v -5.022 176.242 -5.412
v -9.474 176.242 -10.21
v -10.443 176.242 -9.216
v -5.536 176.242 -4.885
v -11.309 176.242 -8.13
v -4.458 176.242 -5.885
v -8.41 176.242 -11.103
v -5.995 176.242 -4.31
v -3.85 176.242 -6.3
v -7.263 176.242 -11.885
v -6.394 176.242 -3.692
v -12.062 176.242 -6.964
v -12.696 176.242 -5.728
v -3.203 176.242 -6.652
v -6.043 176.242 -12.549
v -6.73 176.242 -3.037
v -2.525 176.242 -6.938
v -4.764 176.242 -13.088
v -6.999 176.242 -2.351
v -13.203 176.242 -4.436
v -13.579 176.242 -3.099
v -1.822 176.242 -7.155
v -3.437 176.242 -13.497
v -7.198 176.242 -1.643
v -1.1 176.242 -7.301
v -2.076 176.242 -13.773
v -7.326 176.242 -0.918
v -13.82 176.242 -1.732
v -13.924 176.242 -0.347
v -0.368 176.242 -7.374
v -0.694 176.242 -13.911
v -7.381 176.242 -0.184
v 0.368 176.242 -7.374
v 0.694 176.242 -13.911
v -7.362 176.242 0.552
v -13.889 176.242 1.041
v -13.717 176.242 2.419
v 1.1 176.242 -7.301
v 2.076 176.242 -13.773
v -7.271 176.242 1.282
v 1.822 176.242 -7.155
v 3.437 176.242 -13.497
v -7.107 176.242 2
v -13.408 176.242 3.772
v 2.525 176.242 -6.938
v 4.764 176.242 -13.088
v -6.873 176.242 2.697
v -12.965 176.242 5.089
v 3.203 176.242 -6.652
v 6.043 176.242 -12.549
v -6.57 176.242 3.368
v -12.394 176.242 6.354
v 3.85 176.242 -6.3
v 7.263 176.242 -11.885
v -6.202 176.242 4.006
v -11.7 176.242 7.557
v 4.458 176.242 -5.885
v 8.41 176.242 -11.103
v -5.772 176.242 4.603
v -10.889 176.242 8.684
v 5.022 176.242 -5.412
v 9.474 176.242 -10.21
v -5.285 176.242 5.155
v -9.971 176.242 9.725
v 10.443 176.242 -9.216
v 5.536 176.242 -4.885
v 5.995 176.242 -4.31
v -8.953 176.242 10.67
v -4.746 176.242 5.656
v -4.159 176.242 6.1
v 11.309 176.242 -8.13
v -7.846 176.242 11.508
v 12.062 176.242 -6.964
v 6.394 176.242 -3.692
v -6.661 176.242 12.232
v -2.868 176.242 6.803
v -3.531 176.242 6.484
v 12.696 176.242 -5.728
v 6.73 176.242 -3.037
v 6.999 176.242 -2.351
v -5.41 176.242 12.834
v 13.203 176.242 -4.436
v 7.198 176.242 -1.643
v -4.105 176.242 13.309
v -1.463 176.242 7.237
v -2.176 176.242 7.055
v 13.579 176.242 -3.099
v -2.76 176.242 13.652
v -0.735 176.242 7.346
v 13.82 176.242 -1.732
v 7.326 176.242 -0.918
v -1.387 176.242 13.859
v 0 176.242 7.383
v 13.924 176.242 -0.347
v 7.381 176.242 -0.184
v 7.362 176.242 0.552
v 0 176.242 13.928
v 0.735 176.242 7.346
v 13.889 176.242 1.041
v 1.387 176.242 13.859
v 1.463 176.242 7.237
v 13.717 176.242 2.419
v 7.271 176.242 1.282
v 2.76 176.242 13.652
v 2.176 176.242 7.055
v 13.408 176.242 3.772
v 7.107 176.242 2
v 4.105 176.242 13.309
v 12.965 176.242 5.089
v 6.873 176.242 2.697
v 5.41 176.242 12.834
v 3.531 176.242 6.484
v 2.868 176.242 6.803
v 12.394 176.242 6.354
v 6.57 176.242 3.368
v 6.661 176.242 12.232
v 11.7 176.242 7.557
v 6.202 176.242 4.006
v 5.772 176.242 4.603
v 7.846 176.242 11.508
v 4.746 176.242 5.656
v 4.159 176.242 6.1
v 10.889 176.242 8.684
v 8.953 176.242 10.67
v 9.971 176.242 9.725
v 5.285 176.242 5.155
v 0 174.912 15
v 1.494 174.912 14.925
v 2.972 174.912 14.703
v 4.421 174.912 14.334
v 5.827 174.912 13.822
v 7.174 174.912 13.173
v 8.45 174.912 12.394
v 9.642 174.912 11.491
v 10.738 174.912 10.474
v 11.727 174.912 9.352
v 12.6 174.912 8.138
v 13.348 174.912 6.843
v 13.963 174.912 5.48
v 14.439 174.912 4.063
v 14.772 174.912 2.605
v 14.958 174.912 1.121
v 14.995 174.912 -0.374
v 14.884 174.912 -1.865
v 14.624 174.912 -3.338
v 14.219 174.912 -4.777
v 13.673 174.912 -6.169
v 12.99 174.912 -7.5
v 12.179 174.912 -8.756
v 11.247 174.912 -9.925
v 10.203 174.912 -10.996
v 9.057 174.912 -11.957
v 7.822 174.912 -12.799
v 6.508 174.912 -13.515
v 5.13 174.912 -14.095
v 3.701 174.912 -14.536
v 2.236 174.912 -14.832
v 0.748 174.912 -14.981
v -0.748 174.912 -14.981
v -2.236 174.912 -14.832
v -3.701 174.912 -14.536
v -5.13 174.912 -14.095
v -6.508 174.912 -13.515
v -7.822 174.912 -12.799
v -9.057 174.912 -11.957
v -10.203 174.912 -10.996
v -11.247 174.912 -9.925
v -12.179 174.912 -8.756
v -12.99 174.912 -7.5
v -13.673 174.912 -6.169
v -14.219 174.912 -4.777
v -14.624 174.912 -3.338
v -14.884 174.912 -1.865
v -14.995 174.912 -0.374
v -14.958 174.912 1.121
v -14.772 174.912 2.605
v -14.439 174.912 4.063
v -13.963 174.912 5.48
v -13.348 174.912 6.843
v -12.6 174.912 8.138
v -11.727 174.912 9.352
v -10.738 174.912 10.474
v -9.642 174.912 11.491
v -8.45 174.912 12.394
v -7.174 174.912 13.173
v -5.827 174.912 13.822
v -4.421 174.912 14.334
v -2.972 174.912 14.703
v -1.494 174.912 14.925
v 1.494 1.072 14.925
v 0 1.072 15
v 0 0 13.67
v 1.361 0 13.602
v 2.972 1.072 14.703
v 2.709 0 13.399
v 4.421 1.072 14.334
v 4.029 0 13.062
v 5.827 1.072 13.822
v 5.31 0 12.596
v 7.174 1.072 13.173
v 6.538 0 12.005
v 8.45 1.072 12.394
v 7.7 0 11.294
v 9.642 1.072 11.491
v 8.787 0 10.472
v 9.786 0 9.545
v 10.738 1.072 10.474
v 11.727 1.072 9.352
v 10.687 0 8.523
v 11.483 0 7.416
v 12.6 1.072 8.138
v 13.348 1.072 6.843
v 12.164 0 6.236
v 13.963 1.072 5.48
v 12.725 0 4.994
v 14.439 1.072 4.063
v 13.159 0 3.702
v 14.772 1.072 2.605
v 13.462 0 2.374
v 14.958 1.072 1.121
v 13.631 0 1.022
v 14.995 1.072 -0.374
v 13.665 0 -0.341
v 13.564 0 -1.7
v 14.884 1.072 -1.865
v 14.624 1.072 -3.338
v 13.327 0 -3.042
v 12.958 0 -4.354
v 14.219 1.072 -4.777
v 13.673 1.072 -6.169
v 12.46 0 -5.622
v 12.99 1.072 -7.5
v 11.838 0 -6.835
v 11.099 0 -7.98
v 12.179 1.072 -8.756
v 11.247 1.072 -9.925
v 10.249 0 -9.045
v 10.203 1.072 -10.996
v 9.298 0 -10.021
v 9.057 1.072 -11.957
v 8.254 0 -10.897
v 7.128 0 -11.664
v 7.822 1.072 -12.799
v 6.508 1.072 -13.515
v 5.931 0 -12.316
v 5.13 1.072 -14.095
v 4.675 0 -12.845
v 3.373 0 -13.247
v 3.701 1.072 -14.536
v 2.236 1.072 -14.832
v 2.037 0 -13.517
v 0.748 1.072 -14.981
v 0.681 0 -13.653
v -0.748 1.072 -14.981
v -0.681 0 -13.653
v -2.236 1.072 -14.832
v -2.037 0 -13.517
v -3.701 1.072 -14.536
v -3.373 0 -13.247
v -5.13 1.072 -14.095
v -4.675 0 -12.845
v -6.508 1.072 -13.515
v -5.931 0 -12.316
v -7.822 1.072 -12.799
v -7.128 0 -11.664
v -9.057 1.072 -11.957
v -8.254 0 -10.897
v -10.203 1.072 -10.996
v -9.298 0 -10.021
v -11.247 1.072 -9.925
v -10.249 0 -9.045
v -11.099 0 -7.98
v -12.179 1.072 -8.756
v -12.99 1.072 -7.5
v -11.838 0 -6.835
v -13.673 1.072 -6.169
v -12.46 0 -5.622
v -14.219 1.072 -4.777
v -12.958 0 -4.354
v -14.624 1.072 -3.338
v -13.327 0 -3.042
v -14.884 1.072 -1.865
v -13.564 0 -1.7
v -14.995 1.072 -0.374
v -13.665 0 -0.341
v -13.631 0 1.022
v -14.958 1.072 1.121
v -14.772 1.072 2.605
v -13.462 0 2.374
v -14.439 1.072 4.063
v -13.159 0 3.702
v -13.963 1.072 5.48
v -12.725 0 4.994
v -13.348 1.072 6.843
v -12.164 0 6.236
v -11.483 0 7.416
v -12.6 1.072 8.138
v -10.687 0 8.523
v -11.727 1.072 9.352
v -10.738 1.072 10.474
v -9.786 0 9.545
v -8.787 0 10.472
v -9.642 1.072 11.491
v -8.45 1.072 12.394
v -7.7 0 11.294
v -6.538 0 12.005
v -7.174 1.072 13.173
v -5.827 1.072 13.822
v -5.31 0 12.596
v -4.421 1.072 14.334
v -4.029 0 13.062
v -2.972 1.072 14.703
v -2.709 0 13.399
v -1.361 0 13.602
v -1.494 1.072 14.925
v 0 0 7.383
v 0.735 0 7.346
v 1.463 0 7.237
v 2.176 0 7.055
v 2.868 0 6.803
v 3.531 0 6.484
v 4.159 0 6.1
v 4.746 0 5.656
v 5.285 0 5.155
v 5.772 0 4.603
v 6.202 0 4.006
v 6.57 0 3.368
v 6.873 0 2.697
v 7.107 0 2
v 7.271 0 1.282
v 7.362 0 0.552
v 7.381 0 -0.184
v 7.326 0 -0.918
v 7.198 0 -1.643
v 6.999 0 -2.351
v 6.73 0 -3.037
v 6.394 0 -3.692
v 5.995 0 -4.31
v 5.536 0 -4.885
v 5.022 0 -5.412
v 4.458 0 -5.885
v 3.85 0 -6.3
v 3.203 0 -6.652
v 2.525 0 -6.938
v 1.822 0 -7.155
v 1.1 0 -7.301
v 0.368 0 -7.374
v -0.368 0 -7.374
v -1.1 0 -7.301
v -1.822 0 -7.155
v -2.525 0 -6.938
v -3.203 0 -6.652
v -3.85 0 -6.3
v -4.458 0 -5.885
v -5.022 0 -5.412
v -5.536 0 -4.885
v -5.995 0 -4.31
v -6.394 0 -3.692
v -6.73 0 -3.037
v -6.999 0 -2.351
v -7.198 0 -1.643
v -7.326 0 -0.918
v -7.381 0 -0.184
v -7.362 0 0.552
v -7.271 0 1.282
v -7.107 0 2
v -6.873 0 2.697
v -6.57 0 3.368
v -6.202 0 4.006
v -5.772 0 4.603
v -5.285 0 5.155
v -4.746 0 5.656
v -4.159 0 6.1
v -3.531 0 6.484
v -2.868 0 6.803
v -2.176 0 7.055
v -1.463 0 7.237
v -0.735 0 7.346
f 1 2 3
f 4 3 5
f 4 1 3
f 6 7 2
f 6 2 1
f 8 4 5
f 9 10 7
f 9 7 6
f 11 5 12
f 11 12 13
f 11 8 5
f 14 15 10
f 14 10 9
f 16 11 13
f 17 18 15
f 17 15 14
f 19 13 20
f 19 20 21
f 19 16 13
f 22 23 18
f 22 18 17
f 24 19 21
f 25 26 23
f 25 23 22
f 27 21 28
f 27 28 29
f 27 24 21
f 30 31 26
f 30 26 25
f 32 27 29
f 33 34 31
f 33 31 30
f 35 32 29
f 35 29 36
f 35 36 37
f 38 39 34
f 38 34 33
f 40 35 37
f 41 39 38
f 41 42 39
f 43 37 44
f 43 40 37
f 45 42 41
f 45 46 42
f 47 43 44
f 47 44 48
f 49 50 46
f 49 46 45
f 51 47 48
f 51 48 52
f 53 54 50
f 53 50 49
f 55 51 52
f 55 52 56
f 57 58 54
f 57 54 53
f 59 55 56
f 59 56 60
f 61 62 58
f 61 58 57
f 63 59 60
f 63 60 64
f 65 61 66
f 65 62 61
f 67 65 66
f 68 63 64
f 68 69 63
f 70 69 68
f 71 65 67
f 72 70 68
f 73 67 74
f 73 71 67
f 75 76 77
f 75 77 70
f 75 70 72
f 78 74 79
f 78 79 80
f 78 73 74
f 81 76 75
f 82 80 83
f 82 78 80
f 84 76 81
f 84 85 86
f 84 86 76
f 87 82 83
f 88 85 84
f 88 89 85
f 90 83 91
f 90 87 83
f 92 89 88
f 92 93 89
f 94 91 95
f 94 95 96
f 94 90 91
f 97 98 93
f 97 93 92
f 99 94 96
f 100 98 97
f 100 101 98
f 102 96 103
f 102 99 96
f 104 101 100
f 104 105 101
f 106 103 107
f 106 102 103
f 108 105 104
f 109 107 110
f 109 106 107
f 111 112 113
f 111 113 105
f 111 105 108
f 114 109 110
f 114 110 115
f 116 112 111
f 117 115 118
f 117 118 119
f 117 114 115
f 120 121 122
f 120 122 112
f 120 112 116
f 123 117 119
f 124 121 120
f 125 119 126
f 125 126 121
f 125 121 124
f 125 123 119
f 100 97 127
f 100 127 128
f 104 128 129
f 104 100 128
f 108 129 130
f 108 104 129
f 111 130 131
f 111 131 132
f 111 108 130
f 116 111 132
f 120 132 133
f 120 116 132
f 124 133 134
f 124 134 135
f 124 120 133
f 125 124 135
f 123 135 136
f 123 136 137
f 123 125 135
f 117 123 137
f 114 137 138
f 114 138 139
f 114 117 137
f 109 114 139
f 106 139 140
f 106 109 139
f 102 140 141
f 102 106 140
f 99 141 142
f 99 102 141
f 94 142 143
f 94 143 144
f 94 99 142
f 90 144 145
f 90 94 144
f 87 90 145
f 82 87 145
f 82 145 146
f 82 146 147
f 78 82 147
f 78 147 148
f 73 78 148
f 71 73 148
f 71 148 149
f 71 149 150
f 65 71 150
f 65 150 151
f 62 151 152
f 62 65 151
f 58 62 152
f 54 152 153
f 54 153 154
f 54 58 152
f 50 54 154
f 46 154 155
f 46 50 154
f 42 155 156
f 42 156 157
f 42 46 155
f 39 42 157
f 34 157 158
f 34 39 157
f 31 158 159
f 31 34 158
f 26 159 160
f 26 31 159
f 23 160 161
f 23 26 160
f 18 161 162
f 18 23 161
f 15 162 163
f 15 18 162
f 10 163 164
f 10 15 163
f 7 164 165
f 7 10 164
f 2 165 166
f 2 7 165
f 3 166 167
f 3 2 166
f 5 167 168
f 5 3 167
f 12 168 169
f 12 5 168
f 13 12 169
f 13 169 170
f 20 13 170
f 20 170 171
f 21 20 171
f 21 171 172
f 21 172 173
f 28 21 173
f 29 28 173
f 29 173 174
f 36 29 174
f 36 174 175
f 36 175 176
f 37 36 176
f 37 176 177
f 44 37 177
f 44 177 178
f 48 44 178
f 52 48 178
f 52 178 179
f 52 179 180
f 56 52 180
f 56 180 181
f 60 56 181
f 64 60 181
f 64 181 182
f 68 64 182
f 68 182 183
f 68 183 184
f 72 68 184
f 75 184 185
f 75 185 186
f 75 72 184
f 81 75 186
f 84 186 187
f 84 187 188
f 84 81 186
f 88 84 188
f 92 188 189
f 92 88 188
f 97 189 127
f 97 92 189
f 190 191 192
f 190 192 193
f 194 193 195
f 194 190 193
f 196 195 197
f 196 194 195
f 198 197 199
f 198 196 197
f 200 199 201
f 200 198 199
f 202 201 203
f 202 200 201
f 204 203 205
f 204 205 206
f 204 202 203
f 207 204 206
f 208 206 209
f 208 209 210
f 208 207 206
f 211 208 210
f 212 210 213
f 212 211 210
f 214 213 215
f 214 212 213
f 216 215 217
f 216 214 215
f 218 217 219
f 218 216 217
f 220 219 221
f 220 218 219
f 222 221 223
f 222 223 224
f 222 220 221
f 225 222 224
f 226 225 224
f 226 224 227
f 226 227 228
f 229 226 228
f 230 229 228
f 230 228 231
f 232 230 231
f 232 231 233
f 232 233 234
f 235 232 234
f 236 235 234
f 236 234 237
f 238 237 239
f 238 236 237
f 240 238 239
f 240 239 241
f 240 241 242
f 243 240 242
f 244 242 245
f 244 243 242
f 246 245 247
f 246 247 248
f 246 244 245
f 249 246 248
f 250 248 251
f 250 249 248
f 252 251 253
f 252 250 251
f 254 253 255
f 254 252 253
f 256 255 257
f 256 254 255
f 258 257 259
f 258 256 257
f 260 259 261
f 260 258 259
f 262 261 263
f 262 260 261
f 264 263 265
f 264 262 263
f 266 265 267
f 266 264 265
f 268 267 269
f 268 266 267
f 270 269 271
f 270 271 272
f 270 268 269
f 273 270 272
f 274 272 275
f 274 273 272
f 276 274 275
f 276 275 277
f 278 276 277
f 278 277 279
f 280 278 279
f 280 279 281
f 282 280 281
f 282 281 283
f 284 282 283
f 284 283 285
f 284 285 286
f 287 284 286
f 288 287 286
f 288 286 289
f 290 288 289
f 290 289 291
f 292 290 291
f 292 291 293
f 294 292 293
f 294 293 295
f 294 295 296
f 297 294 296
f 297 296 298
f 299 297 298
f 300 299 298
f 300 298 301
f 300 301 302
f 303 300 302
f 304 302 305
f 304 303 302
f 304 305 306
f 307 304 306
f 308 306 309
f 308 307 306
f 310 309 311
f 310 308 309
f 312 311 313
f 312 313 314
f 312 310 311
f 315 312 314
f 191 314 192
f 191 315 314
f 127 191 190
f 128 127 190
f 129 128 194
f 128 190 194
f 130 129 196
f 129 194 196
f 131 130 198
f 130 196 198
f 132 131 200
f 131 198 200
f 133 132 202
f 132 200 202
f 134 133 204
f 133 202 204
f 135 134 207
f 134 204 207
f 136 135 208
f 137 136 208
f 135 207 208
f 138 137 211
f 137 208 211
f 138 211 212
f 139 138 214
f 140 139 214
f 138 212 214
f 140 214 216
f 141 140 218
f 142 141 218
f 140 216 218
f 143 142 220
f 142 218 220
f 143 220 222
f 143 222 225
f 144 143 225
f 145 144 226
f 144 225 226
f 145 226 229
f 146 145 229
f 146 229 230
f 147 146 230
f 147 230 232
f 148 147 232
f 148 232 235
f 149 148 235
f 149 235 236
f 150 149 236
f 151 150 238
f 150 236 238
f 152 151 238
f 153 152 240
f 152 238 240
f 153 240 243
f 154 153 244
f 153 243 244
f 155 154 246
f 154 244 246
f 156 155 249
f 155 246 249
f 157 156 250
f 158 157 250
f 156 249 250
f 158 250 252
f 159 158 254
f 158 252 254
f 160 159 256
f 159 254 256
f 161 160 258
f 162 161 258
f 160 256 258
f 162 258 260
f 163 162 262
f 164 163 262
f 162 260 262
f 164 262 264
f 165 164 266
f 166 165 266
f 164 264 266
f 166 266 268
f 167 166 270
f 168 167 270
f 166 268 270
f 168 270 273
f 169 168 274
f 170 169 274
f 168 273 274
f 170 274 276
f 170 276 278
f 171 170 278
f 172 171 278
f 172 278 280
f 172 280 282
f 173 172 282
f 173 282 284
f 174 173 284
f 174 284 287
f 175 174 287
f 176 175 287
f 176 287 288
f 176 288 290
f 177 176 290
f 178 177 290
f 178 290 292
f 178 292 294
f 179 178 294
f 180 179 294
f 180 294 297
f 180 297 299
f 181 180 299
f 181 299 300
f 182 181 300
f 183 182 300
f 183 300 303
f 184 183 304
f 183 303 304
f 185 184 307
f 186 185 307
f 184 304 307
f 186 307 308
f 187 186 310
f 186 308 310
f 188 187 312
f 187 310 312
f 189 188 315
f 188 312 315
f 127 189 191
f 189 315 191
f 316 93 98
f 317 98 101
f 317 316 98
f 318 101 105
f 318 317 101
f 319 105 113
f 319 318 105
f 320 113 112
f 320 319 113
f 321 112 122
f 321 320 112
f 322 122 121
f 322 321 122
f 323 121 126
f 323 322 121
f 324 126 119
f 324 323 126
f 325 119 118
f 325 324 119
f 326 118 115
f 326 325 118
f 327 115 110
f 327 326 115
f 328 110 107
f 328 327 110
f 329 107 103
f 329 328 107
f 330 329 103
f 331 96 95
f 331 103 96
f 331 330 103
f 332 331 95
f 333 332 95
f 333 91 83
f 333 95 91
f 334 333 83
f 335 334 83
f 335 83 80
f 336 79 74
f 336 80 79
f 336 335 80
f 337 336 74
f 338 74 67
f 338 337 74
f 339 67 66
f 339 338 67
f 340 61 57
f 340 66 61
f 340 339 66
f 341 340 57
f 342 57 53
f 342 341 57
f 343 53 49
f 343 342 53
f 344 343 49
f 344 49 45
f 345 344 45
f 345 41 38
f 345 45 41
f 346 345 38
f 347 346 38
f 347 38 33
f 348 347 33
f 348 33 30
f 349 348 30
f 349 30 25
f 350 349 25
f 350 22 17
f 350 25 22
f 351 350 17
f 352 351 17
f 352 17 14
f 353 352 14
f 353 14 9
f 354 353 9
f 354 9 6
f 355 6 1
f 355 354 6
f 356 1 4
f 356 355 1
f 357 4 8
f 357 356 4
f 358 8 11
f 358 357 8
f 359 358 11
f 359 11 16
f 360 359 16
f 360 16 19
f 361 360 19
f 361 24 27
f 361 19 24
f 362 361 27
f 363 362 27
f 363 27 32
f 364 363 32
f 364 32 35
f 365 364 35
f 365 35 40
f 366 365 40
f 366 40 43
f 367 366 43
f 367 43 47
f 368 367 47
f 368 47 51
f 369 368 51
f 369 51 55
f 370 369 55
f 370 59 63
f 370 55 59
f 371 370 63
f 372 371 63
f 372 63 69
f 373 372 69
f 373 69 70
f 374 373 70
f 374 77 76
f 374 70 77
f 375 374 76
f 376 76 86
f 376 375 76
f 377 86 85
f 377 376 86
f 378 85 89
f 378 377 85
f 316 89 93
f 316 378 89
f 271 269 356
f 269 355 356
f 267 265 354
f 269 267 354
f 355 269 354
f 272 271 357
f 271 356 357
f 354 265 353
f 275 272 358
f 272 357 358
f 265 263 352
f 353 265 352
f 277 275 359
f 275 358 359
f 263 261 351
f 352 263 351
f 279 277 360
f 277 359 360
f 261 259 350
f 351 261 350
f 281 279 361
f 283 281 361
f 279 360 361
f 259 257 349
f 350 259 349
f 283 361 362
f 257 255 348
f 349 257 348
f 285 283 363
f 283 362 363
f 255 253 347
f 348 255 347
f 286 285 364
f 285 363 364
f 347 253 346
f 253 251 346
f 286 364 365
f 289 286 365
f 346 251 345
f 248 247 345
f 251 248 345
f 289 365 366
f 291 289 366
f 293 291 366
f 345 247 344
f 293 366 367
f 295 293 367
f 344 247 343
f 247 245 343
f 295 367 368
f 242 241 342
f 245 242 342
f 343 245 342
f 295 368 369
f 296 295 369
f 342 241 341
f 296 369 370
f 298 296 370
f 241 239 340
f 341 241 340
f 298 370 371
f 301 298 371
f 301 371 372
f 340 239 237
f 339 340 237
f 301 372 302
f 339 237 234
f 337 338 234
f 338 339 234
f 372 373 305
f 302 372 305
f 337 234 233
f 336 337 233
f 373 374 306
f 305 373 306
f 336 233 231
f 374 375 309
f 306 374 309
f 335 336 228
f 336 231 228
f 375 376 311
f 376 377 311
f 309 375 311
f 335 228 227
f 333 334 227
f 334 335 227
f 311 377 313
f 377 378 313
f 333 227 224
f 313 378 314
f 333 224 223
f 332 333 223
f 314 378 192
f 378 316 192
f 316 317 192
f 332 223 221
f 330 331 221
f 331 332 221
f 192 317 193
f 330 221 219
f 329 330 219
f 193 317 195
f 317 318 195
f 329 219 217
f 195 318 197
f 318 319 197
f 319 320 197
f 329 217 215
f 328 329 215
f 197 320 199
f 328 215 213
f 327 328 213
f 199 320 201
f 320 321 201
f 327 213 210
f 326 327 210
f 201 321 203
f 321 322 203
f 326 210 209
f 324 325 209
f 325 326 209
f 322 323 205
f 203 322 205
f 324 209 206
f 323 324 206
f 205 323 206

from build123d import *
from OCP.BRepFilletAPI import BRepFilletAPI_MakeChamfer

# Parameters (mm, degrees)
SKETCH1_R           = 15
BOSS_EXTRUDE1_DEPTH = 176.241932532
SKETCH2_R           = 7.383069666
CUT_EXTRUDE1_DEPTH  = 178.513996019
CHAMFER1_SIZE       = 1.330295849
CHAMFER1_SIZE2      = 1.071900147


with BuildPart() as part:
    # Sketch1 → Boss-Extrude1 (new body)
    with BuildSketch(Plane(origin=(0, 0, 0), x_dir=(1, 0, 0), z_dir=(0, 1, 0))):
        Circle(SKETCH1_R)
    extrude(amount=BOSS_EXTRUDE1_DEPTH)

    # Sketch2 → Cut-Extrude1 (cut, through all)
    with BuildSketch(Plane(origin=(0, 0, 0), x_dir=(1, 0, 0), z_dir=(0, 1, 0))):
        Circle(SKETCH2_R)
    extrude(amount=CUT_EXTRUDE1_DEPTH, mode=Mode.SUBTRACT)

    # Chamfer1: one chamfer whose edges measure the first distance from different faces: ONE call of the kernel's chamfer builder (chamfer() names one face for all edges)
    chamfer1_edges_1 = [part.edges().sort_by_distance(p)[0] for p in [
        (-15, 176.241932532, 0),
    ]]
    chamfer1_side_1 = [part.faces().sort_by_distance(p)[0] for p in [
        (-15, 88.120966266, 0),
    ]]
    chamfer1_edges_2 = [part.edges().sort_by_distance(p)[0] for p in [
        (-15, 0, 0),
    ]]
    chamfer1_side_2 = [part.faces().sort_by_distance(p)[0] for p in [
        (-14.575735931, 0, 0),
    ]]
    chamfer1 = BRepFilletAPI_MakeChamfer(part.part.solid().wrapped)
    for e in chamfer1_edges_1:
        chamfer1.Add(CHAMFER1_SIZE, CHAMFER1_SIZE2, e.wrapped, chamfer1_side_1[0].wrapped)  # the first distance lies on this face
    for e in chamfer1_edges_2:
        chamfer1.Add(CHAMFER1_SIZE, CHAMFER1_SIZE2, e.wrapped, chamfer1_side_2[0].wrapped)  # the first distance lies on this face
    add(Compound.cast(chamfer1.Shape()), mode=Mode.REPLACE)


solid = part.part
